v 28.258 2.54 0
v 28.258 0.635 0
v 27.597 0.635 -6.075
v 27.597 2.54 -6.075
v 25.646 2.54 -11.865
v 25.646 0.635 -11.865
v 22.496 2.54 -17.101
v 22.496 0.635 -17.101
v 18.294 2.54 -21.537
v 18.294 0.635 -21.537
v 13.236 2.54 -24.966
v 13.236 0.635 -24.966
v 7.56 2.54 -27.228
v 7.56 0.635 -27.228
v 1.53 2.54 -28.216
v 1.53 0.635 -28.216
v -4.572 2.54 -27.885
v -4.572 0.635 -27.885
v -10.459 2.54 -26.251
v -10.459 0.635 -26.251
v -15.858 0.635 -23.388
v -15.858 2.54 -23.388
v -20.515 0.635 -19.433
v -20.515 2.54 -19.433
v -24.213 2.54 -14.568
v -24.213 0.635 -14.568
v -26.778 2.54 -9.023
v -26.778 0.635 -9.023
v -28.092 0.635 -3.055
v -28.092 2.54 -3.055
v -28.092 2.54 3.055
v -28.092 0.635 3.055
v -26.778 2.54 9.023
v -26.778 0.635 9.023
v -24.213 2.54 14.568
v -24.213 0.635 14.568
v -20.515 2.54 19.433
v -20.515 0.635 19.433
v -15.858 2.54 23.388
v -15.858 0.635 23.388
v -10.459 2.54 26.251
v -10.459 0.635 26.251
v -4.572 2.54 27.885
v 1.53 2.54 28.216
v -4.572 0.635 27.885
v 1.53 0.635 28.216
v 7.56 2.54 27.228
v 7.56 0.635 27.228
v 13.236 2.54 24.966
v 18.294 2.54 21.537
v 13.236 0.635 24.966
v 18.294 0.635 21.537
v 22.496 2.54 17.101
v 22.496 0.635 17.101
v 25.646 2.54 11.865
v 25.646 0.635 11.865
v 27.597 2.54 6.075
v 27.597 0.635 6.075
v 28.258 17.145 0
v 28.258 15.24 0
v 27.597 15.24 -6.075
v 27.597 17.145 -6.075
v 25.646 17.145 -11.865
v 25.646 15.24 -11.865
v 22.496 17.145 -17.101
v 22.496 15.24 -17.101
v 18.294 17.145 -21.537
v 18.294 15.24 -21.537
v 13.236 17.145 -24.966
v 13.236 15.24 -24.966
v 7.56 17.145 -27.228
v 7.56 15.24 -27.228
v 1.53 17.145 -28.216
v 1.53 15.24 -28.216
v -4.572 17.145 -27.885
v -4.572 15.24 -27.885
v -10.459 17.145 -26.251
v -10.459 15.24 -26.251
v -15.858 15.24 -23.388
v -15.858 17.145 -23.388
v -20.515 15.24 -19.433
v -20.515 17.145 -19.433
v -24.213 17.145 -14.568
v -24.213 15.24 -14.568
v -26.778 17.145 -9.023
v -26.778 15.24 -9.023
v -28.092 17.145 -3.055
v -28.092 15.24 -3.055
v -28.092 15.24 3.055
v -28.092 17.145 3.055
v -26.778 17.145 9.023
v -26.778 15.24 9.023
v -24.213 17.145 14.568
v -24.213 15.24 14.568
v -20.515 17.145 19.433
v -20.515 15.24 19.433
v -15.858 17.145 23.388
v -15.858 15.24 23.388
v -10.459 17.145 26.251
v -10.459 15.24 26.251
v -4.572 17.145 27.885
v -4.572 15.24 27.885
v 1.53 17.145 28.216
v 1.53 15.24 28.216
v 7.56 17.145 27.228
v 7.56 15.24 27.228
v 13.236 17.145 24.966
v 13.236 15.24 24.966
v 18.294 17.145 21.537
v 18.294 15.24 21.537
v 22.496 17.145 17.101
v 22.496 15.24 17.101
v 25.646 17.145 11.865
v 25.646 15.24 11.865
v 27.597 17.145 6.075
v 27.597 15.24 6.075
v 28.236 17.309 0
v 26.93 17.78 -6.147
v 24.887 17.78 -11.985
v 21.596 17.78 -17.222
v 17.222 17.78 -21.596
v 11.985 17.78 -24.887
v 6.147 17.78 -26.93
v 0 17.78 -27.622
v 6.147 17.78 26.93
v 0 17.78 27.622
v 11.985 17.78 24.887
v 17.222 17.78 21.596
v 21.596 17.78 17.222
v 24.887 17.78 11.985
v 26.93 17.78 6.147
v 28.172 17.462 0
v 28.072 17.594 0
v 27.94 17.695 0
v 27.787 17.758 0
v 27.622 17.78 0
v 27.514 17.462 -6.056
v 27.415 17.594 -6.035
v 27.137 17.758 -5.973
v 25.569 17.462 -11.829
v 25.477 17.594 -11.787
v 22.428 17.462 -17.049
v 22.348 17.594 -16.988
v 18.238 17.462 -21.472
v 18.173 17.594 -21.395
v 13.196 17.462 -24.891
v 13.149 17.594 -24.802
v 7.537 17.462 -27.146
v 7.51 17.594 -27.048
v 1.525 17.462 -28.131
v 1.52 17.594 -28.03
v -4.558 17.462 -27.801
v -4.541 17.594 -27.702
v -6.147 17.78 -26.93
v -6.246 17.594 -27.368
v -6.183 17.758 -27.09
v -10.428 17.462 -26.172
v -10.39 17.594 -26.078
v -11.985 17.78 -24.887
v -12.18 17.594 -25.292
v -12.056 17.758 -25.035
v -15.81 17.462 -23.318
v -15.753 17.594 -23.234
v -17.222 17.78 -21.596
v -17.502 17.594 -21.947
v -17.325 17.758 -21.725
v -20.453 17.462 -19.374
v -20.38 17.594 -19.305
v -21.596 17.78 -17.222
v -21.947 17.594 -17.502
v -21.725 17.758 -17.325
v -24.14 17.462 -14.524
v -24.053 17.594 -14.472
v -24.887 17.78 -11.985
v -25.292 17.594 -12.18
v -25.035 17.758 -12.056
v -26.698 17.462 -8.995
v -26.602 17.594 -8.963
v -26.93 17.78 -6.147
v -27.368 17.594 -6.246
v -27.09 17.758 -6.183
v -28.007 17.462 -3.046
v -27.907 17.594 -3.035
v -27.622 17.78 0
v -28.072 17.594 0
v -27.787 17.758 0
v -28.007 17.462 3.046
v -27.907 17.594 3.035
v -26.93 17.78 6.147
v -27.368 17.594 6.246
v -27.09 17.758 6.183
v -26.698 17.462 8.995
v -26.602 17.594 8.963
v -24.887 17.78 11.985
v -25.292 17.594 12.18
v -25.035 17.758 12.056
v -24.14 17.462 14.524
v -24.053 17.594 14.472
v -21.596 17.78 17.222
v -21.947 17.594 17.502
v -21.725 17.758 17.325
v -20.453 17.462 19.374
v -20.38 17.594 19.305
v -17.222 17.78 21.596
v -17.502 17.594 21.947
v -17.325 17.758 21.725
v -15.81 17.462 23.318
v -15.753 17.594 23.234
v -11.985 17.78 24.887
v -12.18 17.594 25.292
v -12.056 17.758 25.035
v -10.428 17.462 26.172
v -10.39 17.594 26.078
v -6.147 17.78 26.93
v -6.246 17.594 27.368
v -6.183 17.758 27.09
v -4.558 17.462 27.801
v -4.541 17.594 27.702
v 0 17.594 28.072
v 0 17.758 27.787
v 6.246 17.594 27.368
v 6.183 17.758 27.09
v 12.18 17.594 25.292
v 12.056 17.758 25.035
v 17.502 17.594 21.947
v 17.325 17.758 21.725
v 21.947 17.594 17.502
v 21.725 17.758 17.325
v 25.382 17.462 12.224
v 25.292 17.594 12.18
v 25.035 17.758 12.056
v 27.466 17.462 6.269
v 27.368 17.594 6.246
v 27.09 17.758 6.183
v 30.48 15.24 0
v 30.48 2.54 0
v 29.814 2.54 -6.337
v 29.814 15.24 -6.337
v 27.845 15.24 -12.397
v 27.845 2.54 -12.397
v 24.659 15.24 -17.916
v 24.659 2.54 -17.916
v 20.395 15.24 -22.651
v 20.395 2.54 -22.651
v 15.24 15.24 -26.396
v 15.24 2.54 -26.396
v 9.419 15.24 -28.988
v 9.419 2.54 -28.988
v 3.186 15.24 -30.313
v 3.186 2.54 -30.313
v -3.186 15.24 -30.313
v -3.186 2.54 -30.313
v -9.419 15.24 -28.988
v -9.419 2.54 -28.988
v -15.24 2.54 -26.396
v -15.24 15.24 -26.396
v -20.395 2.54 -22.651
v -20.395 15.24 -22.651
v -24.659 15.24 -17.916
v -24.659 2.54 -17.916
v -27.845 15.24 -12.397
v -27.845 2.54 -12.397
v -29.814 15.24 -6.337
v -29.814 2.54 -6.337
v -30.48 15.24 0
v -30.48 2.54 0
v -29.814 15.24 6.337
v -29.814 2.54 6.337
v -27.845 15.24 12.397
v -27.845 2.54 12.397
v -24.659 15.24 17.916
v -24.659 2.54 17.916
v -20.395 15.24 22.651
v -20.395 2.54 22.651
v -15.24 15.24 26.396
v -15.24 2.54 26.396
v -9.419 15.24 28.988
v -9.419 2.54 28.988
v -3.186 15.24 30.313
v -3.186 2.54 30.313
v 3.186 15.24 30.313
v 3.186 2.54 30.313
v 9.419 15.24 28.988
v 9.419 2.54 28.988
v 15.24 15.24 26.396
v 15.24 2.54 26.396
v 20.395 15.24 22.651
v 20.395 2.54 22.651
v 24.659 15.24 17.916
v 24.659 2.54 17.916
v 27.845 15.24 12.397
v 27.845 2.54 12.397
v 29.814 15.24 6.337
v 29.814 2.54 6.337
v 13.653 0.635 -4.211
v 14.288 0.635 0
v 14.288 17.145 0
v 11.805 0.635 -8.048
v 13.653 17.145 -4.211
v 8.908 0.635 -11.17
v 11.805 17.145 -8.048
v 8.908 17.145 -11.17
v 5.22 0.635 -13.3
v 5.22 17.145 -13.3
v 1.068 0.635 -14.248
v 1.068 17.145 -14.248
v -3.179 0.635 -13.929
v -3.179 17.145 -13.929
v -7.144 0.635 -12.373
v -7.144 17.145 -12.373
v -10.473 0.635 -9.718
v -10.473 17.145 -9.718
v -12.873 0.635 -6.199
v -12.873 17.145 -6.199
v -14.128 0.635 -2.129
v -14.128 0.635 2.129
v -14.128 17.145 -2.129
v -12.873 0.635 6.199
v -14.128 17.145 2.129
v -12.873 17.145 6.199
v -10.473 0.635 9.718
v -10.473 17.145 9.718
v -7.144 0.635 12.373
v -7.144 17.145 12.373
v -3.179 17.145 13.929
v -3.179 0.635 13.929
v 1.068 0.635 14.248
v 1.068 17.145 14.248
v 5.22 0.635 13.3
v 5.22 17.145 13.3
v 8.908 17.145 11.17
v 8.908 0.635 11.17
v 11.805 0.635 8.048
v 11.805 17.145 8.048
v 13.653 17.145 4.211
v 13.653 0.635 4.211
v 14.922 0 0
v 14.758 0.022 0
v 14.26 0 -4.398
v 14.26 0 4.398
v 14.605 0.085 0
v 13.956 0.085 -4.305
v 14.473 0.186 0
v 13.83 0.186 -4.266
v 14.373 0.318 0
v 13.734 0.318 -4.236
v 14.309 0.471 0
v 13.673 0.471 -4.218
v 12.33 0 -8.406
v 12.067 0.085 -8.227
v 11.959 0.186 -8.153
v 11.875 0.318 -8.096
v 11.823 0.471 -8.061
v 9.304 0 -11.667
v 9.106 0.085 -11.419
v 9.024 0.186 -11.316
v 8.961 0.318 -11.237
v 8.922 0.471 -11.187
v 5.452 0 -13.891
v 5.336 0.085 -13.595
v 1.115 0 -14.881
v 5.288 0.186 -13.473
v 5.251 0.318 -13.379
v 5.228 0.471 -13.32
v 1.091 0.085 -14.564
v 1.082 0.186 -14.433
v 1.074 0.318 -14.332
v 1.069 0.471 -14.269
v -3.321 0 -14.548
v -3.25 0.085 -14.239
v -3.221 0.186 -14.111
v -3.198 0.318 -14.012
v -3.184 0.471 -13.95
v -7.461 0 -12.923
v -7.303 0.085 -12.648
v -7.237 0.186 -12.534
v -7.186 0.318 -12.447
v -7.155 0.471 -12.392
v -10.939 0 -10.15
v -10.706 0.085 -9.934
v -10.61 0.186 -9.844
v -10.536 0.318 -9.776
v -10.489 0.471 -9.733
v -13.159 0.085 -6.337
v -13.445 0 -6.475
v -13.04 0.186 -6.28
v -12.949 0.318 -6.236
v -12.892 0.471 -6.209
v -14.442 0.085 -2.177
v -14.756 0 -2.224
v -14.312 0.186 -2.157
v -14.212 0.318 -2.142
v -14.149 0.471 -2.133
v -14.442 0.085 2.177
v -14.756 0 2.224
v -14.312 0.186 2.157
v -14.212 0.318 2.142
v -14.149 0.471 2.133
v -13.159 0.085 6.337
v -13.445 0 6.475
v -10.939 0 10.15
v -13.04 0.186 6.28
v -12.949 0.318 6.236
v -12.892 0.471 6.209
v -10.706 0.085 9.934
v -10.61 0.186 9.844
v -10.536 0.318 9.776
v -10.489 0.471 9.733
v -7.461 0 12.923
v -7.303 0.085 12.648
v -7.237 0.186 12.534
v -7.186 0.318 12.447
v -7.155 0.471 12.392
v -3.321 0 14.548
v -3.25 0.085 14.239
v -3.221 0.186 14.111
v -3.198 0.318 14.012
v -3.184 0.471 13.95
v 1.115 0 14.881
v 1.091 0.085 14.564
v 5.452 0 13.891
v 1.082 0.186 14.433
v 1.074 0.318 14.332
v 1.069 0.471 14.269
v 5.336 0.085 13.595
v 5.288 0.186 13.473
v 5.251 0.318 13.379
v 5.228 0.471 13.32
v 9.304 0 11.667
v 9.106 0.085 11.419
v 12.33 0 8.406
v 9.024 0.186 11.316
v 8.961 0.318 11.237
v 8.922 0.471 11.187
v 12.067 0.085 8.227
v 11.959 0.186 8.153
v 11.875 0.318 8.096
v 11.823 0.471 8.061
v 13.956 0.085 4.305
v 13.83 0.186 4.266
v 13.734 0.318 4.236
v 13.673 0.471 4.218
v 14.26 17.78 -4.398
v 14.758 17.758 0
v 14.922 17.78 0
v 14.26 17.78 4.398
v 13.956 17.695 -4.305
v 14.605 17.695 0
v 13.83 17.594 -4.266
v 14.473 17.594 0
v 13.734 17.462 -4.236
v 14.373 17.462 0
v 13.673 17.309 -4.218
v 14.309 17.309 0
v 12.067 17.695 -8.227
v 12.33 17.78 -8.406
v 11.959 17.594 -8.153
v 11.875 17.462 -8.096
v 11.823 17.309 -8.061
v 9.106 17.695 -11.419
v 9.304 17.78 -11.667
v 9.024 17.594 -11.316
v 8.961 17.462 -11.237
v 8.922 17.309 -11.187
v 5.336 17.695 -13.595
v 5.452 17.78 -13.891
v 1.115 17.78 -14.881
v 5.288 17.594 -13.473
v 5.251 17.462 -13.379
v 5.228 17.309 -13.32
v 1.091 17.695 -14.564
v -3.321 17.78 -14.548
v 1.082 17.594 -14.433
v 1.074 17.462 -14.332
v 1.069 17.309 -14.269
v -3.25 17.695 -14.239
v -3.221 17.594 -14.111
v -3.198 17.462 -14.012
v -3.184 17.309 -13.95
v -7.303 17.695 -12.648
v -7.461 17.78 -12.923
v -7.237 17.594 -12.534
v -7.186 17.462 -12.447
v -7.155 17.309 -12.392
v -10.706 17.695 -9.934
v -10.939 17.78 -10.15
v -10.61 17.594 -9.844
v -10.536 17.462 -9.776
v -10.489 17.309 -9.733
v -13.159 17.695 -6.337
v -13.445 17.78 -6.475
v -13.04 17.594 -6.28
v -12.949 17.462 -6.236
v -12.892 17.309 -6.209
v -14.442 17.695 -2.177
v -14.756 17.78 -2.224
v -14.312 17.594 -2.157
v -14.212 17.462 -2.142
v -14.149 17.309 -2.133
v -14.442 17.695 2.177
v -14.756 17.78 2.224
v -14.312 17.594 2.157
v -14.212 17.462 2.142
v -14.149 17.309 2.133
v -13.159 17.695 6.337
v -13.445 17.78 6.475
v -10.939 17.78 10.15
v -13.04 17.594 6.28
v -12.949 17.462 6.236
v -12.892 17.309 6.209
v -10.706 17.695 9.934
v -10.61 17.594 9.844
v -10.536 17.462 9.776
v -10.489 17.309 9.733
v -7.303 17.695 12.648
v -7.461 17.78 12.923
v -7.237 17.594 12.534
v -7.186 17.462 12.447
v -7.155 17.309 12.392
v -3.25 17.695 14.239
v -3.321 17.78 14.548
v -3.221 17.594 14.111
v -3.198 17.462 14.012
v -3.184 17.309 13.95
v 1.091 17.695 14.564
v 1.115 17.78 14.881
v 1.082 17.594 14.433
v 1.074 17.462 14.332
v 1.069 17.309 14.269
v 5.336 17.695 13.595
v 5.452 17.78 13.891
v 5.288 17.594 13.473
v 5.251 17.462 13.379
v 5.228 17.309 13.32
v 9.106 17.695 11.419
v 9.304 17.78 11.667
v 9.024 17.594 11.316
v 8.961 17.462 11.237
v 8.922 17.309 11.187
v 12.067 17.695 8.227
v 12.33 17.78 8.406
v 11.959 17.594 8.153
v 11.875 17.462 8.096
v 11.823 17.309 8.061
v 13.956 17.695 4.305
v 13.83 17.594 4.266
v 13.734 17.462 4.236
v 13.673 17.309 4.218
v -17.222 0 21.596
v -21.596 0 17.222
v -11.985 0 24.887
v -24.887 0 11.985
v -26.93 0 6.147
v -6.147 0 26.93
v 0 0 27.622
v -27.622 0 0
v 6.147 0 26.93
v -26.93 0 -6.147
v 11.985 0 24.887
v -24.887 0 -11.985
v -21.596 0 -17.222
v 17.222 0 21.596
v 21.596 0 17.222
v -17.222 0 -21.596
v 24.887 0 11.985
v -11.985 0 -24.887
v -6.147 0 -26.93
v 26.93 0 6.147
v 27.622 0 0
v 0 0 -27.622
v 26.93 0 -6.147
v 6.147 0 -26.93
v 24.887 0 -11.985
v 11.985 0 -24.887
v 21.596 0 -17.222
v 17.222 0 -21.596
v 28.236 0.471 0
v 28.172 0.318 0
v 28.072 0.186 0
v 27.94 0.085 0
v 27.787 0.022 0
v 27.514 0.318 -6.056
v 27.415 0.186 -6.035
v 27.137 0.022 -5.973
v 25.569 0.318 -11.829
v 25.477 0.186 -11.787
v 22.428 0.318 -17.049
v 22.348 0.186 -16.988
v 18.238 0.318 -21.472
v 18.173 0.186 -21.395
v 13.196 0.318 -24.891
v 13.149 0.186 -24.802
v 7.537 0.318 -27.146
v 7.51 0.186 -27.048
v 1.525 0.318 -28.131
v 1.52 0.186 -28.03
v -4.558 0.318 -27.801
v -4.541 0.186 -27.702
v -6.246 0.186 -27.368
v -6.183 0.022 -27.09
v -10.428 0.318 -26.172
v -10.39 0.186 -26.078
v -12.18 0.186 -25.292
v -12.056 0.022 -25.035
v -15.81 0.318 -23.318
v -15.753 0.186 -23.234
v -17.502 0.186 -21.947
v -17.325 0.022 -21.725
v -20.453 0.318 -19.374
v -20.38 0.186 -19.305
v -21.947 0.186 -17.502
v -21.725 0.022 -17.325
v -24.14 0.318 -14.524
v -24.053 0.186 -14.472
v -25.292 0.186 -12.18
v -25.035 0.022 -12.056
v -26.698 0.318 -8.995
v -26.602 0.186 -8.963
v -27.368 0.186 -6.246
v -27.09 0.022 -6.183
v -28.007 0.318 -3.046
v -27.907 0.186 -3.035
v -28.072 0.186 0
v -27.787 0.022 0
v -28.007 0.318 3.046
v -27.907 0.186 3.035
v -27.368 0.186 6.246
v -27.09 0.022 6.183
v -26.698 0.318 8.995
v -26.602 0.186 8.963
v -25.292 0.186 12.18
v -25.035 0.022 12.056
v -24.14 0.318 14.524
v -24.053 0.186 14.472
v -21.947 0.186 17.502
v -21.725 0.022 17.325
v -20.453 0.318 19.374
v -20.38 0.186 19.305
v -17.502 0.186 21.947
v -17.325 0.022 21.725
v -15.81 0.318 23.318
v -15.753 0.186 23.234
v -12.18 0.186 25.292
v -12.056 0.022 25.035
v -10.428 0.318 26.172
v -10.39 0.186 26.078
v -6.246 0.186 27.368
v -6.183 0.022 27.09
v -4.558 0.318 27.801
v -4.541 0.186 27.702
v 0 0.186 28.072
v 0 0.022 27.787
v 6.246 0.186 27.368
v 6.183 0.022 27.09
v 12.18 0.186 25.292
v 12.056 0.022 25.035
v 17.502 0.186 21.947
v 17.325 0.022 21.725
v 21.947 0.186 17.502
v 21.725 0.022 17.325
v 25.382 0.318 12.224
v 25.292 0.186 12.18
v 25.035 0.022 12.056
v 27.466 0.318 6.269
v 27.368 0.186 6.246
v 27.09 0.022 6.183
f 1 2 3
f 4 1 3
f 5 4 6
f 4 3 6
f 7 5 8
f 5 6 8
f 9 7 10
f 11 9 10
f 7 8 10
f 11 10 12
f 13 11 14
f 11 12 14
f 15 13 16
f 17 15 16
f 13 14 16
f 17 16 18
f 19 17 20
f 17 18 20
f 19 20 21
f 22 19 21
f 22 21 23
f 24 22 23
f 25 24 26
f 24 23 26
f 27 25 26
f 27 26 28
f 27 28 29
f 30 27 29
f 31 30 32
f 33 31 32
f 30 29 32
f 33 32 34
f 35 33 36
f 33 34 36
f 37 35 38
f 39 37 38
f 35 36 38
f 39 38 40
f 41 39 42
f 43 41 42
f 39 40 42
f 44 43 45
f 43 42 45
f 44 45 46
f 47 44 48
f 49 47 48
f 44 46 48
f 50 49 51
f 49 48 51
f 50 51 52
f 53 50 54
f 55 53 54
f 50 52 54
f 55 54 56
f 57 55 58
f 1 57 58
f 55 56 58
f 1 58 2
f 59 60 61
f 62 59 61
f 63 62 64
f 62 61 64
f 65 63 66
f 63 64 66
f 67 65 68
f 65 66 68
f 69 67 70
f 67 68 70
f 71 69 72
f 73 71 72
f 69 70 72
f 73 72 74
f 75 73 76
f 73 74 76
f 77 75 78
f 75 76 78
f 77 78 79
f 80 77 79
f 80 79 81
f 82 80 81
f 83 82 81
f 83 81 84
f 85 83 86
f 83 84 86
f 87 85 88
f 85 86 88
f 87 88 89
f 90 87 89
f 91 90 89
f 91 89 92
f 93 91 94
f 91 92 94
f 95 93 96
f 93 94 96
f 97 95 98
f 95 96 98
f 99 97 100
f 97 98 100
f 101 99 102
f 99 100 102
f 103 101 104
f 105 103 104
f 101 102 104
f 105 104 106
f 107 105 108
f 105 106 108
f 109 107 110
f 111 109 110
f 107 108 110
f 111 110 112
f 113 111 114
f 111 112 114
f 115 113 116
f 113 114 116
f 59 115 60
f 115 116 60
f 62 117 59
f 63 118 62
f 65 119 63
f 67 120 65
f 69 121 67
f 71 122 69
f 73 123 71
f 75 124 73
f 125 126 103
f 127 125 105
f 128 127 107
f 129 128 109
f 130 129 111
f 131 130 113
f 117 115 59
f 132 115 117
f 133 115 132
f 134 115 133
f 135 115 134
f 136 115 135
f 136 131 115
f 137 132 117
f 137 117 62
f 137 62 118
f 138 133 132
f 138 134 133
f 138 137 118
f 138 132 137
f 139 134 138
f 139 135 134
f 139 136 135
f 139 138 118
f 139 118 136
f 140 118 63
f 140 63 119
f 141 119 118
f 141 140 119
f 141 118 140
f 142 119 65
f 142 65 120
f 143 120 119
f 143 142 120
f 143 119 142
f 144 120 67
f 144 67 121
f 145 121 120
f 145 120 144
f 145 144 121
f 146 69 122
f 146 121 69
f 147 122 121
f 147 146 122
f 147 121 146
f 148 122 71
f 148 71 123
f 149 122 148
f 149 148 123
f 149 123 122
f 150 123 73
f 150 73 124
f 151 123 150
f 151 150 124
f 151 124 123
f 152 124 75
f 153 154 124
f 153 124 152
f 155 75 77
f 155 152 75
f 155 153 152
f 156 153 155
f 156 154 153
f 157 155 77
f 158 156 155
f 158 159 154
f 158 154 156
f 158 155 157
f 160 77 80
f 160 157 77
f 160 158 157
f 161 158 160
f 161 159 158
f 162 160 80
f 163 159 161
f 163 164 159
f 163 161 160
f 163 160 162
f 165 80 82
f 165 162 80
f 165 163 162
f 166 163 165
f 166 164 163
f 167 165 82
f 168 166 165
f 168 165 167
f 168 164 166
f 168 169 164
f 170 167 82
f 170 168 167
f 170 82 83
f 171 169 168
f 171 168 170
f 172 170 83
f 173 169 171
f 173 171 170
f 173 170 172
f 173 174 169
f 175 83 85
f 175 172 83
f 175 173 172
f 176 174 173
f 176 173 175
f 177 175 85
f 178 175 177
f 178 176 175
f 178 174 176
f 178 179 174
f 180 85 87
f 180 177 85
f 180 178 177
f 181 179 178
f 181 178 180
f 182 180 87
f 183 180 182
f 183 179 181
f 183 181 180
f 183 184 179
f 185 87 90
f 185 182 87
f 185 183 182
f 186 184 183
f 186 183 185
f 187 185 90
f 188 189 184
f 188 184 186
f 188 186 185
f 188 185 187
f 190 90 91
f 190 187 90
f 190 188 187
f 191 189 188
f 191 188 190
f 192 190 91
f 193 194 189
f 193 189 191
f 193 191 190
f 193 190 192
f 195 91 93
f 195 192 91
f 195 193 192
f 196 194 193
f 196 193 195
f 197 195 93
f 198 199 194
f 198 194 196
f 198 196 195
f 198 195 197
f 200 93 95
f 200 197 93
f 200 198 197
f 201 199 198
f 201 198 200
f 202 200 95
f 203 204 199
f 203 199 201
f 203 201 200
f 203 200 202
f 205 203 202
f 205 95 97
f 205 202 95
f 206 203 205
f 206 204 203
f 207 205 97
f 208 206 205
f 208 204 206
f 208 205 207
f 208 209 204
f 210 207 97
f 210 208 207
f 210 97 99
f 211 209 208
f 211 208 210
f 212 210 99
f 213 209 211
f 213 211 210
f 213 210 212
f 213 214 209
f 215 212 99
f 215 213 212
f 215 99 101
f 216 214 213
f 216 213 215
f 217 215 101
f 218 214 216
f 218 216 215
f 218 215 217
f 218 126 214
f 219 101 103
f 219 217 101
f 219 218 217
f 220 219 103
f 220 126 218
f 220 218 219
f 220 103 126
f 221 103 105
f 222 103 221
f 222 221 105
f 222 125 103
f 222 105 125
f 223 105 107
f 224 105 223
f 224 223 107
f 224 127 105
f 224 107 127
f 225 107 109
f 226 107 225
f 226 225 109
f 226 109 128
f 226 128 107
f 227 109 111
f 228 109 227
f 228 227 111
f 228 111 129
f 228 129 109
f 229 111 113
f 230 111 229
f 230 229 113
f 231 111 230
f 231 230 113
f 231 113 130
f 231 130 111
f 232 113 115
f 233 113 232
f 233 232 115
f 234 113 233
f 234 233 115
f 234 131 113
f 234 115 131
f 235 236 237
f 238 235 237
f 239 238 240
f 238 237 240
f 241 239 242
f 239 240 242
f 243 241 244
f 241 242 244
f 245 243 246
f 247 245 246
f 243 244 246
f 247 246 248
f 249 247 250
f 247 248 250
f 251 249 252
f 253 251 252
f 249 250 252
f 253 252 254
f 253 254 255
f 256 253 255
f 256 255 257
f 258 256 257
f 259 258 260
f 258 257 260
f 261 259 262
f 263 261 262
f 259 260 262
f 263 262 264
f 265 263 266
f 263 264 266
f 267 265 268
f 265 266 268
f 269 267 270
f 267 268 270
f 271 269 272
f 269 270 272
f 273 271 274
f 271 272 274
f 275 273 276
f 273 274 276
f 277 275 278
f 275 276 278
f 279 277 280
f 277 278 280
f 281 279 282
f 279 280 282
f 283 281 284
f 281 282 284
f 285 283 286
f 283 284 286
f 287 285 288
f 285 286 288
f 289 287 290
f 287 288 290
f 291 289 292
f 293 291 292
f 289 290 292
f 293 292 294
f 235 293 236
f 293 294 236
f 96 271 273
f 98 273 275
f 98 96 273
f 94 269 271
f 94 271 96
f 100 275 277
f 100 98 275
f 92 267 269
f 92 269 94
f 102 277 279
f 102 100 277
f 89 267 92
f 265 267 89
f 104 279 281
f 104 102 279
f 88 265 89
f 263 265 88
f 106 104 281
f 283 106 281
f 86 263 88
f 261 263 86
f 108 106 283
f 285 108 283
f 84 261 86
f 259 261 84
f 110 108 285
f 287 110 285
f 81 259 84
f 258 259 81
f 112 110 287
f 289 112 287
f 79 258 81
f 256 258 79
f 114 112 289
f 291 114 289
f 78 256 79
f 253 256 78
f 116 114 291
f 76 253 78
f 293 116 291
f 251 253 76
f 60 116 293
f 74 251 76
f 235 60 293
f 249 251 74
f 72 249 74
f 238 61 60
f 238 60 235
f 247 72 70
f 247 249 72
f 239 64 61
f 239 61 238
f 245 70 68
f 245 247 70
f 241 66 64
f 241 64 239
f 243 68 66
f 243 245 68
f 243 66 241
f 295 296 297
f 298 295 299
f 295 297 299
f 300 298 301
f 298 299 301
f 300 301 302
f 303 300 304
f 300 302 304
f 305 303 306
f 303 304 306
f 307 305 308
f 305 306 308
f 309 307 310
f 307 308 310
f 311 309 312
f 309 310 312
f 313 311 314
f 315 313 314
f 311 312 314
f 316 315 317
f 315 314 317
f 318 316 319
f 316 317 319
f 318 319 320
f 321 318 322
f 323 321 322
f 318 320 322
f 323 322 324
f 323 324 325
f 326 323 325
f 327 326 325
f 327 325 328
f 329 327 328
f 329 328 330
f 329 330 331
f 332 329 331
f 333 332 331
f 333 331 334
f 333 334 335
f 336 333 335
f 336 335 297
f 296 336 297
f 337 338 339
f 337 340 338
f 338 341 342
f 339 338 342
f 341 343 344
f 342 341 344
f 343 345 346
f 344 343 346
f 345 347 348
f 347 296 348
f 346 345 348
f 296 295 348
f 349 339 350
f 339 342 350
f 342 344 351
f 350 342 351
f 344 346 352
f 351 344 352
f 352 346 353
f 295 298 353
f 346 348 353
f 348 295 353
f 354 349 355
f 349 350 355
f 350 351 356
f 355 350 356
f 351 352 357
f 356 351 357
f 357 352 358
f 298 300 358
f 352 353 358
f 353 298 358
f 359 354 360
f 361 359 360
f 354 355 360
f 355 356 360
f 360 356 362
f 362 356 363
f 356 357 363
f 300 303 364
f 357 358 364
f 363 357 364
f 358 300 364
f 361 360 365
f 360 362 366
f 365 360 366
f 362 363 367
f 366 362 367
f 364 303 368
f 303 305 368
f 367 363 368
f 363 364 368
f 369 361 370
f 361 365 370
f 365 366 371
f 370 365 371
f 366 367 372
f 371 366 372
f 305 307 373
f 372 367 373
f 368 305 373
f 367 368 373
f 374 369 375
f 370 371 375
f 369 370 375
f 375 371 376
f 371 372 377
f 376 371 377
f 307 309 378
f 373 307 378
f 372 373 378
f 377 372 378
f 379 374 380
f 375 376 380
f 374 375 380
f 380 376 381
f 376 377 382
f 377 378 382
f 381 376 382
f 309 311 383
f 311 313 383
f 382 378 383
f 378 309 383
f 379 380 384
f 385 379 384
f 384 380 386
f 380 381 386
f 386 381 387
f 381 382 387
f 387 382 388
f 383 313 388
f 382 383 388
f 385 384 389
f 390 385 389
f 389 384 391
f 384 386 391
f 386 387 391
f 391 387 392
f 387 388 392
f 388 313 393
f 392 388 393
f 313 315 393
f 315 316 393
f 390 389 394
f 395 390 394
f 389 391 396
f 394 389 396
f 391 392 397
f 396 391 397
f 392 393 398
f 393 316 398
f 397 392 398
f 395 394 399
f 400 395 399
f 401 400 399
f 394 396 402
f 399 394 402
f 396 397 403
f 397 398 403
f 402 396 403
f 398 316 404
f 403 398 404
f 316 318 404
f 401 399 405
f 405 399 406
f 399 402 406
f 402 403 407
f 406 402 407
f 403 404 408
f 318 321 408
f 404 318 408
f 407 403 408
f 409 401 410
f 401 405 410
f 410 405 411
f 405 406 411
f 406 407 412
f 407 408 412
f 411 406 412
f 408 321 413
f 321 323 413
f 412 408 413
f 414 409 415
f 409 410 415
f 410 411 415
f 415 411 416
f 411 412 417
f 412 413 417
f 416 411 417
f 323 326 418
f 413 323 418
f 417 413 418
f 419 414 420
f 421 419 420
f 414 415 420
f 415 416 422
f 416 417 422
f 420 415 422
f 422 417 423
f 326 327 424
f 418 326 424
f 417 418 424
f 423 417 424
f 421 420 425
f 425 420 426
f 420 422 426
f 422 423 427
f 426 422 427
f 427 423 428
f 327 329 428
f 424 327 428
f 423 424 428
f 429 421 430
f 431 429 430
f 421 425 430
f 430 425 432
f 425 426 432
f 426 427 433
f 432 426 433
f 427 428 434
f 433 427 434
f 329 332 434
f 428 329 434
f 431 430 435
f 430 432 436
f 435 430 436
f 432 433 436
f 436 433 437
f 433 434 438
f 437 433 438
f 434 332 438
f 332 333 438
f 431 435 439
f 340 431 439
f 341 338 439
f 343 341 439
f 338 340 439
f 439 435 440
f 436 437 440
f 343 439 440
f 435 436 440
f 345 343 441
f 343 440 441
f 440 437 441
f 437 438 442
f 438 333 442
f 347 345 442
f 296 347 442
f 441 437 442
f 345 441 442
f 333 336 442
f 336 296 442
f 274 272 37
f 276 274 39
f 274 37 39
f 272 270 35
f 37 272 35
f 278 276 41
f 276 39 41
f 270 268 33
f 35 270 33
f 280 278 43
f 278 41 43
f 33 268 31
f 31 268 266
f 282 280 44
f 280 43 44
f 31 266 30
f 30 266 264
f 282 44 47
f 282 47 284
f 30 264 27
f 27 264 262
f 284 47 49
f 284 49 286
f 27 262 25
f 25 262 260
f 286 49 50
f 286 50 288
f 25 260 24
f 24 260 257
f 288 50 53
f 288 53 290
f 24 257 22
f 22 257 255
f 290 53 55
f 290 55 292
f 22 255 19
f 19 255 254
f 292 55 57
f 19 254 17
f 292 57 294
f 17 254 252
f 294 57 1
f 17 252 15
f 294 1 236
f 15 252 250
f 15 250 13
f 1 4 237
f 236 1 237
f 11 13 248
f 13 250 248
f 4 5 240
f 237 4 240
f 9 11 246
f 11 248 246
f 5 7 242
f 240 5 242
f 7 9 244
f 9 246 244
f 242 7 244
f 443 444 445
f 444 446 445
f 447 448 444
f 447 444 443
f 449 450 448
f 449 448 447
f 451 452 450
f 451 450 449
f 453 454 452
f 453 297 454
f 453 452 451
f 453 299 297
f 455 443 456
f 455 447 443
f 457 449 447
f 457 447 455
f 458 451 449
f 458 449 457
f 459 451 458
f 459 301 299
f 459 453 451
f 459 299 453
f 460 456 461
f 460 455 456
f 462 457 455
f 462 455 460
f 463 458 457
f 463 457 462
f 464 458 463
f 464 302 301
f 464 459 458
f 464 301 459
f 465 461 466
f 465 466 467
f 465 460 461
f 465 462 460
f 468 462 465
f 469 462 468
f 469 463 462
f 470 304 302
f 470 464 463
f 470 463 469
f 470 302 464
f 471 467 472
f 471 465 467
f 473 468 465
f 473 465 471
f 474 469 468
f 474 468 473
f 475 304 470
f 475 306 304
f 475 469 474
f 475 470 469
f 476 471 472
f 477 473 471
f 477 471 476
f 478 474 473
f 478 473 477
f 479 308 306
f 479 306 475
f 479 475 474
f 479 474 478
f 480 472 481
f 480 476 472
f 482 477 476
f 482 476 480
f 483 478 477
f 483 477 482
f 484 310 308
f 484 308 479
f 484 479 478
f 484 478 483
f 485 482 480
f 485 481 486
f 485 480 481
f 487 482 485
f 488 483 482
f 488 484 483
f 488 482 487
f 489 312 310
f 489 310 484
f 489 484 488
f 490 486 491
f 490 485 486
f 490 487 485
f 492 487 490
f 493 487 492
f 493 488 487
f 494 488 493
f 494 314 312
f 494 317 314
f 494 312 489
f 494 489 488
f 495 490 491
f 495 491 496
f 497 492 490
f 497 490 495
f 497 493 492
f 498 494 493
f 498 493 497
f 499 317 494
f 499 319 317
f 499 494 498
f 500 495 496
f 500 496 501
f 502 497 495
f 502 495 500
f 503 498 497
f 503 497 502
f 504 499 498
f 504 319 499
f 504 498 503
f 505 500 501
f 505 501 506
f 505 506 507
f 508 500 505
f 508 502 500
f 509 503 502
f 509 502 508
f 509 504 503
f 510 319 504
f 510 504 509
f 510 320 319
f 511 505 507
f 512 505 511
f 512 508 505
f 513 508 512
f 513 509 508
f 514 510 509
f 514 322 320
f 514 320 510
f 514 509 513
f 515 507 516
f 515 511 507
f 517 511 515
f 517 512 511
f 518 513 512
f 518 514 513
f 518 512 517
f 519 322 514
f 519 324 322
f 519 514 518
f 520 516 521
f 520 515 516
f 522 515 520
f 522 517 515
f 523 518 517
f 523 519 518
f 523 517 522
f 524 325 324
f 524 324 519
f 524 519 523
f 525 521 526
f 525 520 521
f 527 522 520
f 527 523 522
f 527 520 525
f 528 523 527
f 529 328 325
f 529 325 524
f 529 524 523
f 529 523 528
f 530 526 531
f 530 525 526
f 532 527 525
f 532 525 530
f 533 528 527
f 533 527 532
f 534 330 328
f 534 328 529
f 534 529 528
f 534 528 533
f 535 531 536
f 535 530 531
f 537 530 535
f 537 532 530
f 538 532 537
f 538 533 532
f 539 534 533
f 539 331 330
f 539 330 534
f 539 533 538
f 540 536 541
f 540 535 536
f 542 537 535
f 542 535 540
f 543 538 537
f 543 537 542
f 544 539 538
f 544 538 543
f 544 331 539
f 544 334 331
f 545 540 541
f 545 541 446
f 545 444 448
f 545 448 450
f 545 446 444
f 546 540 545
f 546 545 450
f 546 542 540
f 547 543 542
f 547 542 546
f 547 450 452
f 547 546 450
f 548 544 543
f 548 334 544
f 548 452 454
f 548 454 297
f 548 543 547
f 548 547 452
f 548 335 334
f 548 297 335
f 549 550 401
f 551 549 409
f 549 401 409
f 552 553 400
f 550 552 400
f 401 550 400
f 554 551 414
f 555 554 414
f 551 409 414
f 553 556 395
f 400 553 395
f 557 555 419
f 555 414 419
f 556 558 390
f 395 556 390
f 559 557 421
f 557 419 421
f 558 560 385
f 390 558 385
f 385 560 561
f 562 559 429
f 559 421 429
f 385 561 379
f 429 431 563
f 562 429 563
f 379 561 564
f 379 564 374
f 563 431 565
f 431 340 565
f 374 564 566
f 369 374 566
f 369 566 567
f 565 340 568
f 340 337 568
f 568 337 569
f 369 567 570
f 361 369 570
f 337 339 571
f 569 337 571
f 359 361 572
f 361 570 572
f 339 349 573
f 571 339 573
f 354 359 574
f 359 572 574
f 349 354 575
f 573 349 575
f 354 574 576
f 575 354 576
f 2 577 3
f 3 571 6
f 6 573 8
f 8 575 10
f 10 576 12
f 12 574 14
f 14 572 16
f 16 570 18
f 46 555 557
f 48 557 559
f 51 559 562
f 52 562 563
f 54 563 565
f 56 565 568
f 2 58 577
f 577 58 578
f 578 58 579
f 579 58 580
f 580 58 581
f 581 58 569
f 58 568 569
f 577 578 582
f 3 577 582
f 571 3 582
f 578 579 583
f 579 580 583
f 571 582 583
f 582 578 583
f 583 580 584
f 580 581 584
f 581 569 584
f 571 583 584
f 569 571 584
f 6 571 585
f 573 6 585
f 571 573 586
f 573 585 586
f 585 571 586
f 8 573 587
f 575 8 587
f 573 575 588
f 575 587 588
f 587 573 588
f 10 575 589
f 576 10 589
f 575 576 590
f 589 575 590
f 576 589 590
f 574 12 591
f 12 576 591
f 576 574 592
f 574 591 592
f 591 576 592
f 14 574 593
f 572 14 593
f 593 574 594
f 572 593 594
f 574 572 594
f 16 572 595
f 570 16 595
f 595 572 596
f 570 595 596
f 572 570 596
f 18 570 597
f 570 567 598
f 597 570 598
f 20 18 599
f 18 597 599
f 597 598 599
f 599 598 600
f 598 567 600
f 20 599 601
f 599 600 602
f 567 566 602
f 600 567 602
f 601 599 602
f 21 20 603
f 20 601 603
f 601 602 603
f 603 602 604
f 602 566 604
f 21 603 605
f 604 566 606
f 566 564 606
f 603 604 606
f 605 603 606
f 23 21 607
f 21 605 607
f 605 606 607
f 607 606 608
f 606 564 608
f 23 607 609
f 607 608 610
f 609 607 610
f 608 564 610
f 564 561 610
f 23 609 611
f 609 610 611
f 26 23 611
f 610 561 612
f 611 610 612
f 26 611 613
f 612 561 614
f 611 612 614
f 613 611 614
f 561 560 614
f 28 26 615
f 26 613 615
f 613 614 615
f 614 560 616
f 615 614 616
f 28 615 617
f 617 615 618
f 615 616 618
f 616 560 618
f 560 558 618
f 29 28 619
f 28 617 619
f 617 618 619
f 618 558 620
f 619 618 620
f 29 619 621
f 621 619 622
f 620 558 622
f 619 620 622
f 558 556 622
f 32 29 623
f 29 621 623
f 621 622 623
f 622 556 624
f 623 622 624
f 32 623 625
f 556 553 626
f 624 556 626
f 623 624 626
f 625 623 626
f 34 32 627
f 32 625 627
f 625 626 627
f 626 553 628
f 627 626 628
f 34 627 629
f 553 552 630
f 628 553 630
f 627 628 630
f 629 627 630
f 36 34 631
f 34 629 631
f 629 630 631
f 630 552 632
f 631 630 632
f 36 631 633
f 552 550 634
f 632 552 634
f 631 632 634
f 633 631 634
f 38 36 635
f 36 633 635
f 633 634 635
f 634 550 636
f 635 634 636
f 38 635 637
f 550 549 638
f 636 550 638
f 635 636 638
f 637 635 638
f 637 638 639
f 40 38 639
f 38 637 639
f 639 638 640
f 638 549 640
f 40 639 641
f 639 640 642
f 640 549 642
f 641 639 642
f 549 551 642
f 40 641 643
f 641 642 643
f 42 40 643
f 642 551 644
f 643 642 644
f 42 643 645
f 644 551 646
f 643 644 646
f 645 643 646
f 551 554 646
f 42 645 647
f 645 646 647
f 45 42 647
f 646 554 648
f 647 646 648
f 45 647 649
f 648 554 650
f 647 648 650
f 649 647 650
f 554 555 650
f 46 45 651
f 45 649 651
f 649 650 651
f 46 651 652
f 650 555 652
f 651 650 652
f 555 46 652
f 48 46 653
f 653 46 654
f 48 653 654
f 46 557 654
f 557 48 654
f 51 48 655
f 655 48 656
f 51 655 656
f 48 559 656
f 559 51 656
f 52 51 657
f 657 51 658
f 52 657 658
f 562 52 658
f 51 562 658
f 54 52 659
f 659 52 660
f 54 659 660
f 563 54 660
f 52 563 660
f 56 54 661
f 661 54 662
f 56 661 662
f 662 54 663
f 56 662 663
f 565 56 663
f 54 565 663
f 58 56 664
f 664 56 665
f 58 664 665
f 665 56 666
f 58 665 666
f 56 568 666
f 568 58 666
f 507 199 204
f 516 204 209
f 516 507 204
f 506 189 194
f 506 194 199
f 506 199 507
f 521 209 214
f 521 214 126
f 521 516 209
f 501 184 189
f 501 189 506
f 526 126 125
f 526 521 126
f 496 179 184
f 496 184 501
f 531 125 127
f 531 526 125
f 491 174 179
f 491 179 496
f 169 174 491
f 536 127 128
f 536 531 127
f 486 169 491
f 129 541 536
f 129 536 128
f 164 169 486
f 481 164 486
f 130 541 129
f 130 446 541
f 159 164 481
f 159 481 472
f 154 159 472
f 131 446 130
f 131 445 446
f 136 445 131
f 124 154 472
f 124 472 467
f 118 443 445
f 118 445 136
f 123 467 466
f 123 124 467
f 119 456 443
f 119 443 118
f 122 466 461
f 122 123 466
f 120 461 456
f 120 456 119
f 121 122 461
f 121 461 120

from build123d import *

# Parameters (mm, degrees)
SKETCH1_R           = 28.2575
STEP_DEPTH          = 2.54
SKETCH2_R           = 30.48
BODY_DEPTH          = 12.7
SKETCH3_R           = 28.2575
BOSS_EXTRUDE3_DEPTH = 2.54
SKETCH4_R           = 14.2875
CUT_EXTRUDE1_DEPTH  = 18.78
FILLET1_R           = 0.635


with BuildPart() as part:
    # Sketch1 → Step (new body)
    with BuildSketch(Plane(origin=(0, 0, 0), x_dir=(1, 0, 0), z_dir=(0, 1, 0))):
        Circle(SKETCH1_R)
    extrude(amount=STEP_DEPTH)

    # Sketch2 → Body (add)
    with BuildSketch(Plane(origin=(0, 2.54, 0), x_dir=(1, 0, 0), z_dir=(0, 1, 0))):
        Circle(SKETCH2_R)
    extrude(amount=BODY_DEPTH)

    # Sketch3 → Boss-Extrude3 (add)
    with BuildSketch(Plane(origin=(0, 15.24, 0), x_dir=(1, 0, 0), z_dir=(0, 1, 0))):
        Circle(SKETCH3_R)
    extrude(amount=BOSS_EXTRUDE3_DEPTH)

    # Sketch4 → Cut-Extrude1 (cut, through all)
    with BuildSketch(Plane(origin=(0, 17.78, 0), x_dir=(1, 0, 0), z_dir=(0, 1, 0))):
        Circle(SKETCH4_R)
    extrude(amount=-CUT_EXTRUDE1_DEPTH, mode=Mode.SUBTRACT)

    # Fillet1
    fillet1_edges = [part.edges().sort_by_distance(p)[0] for p in [
        (-28.2575, 17.78, 0),
        (-14.2875, 0, 0),
        (-14.2875, 17.78, 0),
        (-28.2575, 0, 0),
    ]]
    fillet(fillet1_edges, radius=FILLET1_R)


solid = part.part
